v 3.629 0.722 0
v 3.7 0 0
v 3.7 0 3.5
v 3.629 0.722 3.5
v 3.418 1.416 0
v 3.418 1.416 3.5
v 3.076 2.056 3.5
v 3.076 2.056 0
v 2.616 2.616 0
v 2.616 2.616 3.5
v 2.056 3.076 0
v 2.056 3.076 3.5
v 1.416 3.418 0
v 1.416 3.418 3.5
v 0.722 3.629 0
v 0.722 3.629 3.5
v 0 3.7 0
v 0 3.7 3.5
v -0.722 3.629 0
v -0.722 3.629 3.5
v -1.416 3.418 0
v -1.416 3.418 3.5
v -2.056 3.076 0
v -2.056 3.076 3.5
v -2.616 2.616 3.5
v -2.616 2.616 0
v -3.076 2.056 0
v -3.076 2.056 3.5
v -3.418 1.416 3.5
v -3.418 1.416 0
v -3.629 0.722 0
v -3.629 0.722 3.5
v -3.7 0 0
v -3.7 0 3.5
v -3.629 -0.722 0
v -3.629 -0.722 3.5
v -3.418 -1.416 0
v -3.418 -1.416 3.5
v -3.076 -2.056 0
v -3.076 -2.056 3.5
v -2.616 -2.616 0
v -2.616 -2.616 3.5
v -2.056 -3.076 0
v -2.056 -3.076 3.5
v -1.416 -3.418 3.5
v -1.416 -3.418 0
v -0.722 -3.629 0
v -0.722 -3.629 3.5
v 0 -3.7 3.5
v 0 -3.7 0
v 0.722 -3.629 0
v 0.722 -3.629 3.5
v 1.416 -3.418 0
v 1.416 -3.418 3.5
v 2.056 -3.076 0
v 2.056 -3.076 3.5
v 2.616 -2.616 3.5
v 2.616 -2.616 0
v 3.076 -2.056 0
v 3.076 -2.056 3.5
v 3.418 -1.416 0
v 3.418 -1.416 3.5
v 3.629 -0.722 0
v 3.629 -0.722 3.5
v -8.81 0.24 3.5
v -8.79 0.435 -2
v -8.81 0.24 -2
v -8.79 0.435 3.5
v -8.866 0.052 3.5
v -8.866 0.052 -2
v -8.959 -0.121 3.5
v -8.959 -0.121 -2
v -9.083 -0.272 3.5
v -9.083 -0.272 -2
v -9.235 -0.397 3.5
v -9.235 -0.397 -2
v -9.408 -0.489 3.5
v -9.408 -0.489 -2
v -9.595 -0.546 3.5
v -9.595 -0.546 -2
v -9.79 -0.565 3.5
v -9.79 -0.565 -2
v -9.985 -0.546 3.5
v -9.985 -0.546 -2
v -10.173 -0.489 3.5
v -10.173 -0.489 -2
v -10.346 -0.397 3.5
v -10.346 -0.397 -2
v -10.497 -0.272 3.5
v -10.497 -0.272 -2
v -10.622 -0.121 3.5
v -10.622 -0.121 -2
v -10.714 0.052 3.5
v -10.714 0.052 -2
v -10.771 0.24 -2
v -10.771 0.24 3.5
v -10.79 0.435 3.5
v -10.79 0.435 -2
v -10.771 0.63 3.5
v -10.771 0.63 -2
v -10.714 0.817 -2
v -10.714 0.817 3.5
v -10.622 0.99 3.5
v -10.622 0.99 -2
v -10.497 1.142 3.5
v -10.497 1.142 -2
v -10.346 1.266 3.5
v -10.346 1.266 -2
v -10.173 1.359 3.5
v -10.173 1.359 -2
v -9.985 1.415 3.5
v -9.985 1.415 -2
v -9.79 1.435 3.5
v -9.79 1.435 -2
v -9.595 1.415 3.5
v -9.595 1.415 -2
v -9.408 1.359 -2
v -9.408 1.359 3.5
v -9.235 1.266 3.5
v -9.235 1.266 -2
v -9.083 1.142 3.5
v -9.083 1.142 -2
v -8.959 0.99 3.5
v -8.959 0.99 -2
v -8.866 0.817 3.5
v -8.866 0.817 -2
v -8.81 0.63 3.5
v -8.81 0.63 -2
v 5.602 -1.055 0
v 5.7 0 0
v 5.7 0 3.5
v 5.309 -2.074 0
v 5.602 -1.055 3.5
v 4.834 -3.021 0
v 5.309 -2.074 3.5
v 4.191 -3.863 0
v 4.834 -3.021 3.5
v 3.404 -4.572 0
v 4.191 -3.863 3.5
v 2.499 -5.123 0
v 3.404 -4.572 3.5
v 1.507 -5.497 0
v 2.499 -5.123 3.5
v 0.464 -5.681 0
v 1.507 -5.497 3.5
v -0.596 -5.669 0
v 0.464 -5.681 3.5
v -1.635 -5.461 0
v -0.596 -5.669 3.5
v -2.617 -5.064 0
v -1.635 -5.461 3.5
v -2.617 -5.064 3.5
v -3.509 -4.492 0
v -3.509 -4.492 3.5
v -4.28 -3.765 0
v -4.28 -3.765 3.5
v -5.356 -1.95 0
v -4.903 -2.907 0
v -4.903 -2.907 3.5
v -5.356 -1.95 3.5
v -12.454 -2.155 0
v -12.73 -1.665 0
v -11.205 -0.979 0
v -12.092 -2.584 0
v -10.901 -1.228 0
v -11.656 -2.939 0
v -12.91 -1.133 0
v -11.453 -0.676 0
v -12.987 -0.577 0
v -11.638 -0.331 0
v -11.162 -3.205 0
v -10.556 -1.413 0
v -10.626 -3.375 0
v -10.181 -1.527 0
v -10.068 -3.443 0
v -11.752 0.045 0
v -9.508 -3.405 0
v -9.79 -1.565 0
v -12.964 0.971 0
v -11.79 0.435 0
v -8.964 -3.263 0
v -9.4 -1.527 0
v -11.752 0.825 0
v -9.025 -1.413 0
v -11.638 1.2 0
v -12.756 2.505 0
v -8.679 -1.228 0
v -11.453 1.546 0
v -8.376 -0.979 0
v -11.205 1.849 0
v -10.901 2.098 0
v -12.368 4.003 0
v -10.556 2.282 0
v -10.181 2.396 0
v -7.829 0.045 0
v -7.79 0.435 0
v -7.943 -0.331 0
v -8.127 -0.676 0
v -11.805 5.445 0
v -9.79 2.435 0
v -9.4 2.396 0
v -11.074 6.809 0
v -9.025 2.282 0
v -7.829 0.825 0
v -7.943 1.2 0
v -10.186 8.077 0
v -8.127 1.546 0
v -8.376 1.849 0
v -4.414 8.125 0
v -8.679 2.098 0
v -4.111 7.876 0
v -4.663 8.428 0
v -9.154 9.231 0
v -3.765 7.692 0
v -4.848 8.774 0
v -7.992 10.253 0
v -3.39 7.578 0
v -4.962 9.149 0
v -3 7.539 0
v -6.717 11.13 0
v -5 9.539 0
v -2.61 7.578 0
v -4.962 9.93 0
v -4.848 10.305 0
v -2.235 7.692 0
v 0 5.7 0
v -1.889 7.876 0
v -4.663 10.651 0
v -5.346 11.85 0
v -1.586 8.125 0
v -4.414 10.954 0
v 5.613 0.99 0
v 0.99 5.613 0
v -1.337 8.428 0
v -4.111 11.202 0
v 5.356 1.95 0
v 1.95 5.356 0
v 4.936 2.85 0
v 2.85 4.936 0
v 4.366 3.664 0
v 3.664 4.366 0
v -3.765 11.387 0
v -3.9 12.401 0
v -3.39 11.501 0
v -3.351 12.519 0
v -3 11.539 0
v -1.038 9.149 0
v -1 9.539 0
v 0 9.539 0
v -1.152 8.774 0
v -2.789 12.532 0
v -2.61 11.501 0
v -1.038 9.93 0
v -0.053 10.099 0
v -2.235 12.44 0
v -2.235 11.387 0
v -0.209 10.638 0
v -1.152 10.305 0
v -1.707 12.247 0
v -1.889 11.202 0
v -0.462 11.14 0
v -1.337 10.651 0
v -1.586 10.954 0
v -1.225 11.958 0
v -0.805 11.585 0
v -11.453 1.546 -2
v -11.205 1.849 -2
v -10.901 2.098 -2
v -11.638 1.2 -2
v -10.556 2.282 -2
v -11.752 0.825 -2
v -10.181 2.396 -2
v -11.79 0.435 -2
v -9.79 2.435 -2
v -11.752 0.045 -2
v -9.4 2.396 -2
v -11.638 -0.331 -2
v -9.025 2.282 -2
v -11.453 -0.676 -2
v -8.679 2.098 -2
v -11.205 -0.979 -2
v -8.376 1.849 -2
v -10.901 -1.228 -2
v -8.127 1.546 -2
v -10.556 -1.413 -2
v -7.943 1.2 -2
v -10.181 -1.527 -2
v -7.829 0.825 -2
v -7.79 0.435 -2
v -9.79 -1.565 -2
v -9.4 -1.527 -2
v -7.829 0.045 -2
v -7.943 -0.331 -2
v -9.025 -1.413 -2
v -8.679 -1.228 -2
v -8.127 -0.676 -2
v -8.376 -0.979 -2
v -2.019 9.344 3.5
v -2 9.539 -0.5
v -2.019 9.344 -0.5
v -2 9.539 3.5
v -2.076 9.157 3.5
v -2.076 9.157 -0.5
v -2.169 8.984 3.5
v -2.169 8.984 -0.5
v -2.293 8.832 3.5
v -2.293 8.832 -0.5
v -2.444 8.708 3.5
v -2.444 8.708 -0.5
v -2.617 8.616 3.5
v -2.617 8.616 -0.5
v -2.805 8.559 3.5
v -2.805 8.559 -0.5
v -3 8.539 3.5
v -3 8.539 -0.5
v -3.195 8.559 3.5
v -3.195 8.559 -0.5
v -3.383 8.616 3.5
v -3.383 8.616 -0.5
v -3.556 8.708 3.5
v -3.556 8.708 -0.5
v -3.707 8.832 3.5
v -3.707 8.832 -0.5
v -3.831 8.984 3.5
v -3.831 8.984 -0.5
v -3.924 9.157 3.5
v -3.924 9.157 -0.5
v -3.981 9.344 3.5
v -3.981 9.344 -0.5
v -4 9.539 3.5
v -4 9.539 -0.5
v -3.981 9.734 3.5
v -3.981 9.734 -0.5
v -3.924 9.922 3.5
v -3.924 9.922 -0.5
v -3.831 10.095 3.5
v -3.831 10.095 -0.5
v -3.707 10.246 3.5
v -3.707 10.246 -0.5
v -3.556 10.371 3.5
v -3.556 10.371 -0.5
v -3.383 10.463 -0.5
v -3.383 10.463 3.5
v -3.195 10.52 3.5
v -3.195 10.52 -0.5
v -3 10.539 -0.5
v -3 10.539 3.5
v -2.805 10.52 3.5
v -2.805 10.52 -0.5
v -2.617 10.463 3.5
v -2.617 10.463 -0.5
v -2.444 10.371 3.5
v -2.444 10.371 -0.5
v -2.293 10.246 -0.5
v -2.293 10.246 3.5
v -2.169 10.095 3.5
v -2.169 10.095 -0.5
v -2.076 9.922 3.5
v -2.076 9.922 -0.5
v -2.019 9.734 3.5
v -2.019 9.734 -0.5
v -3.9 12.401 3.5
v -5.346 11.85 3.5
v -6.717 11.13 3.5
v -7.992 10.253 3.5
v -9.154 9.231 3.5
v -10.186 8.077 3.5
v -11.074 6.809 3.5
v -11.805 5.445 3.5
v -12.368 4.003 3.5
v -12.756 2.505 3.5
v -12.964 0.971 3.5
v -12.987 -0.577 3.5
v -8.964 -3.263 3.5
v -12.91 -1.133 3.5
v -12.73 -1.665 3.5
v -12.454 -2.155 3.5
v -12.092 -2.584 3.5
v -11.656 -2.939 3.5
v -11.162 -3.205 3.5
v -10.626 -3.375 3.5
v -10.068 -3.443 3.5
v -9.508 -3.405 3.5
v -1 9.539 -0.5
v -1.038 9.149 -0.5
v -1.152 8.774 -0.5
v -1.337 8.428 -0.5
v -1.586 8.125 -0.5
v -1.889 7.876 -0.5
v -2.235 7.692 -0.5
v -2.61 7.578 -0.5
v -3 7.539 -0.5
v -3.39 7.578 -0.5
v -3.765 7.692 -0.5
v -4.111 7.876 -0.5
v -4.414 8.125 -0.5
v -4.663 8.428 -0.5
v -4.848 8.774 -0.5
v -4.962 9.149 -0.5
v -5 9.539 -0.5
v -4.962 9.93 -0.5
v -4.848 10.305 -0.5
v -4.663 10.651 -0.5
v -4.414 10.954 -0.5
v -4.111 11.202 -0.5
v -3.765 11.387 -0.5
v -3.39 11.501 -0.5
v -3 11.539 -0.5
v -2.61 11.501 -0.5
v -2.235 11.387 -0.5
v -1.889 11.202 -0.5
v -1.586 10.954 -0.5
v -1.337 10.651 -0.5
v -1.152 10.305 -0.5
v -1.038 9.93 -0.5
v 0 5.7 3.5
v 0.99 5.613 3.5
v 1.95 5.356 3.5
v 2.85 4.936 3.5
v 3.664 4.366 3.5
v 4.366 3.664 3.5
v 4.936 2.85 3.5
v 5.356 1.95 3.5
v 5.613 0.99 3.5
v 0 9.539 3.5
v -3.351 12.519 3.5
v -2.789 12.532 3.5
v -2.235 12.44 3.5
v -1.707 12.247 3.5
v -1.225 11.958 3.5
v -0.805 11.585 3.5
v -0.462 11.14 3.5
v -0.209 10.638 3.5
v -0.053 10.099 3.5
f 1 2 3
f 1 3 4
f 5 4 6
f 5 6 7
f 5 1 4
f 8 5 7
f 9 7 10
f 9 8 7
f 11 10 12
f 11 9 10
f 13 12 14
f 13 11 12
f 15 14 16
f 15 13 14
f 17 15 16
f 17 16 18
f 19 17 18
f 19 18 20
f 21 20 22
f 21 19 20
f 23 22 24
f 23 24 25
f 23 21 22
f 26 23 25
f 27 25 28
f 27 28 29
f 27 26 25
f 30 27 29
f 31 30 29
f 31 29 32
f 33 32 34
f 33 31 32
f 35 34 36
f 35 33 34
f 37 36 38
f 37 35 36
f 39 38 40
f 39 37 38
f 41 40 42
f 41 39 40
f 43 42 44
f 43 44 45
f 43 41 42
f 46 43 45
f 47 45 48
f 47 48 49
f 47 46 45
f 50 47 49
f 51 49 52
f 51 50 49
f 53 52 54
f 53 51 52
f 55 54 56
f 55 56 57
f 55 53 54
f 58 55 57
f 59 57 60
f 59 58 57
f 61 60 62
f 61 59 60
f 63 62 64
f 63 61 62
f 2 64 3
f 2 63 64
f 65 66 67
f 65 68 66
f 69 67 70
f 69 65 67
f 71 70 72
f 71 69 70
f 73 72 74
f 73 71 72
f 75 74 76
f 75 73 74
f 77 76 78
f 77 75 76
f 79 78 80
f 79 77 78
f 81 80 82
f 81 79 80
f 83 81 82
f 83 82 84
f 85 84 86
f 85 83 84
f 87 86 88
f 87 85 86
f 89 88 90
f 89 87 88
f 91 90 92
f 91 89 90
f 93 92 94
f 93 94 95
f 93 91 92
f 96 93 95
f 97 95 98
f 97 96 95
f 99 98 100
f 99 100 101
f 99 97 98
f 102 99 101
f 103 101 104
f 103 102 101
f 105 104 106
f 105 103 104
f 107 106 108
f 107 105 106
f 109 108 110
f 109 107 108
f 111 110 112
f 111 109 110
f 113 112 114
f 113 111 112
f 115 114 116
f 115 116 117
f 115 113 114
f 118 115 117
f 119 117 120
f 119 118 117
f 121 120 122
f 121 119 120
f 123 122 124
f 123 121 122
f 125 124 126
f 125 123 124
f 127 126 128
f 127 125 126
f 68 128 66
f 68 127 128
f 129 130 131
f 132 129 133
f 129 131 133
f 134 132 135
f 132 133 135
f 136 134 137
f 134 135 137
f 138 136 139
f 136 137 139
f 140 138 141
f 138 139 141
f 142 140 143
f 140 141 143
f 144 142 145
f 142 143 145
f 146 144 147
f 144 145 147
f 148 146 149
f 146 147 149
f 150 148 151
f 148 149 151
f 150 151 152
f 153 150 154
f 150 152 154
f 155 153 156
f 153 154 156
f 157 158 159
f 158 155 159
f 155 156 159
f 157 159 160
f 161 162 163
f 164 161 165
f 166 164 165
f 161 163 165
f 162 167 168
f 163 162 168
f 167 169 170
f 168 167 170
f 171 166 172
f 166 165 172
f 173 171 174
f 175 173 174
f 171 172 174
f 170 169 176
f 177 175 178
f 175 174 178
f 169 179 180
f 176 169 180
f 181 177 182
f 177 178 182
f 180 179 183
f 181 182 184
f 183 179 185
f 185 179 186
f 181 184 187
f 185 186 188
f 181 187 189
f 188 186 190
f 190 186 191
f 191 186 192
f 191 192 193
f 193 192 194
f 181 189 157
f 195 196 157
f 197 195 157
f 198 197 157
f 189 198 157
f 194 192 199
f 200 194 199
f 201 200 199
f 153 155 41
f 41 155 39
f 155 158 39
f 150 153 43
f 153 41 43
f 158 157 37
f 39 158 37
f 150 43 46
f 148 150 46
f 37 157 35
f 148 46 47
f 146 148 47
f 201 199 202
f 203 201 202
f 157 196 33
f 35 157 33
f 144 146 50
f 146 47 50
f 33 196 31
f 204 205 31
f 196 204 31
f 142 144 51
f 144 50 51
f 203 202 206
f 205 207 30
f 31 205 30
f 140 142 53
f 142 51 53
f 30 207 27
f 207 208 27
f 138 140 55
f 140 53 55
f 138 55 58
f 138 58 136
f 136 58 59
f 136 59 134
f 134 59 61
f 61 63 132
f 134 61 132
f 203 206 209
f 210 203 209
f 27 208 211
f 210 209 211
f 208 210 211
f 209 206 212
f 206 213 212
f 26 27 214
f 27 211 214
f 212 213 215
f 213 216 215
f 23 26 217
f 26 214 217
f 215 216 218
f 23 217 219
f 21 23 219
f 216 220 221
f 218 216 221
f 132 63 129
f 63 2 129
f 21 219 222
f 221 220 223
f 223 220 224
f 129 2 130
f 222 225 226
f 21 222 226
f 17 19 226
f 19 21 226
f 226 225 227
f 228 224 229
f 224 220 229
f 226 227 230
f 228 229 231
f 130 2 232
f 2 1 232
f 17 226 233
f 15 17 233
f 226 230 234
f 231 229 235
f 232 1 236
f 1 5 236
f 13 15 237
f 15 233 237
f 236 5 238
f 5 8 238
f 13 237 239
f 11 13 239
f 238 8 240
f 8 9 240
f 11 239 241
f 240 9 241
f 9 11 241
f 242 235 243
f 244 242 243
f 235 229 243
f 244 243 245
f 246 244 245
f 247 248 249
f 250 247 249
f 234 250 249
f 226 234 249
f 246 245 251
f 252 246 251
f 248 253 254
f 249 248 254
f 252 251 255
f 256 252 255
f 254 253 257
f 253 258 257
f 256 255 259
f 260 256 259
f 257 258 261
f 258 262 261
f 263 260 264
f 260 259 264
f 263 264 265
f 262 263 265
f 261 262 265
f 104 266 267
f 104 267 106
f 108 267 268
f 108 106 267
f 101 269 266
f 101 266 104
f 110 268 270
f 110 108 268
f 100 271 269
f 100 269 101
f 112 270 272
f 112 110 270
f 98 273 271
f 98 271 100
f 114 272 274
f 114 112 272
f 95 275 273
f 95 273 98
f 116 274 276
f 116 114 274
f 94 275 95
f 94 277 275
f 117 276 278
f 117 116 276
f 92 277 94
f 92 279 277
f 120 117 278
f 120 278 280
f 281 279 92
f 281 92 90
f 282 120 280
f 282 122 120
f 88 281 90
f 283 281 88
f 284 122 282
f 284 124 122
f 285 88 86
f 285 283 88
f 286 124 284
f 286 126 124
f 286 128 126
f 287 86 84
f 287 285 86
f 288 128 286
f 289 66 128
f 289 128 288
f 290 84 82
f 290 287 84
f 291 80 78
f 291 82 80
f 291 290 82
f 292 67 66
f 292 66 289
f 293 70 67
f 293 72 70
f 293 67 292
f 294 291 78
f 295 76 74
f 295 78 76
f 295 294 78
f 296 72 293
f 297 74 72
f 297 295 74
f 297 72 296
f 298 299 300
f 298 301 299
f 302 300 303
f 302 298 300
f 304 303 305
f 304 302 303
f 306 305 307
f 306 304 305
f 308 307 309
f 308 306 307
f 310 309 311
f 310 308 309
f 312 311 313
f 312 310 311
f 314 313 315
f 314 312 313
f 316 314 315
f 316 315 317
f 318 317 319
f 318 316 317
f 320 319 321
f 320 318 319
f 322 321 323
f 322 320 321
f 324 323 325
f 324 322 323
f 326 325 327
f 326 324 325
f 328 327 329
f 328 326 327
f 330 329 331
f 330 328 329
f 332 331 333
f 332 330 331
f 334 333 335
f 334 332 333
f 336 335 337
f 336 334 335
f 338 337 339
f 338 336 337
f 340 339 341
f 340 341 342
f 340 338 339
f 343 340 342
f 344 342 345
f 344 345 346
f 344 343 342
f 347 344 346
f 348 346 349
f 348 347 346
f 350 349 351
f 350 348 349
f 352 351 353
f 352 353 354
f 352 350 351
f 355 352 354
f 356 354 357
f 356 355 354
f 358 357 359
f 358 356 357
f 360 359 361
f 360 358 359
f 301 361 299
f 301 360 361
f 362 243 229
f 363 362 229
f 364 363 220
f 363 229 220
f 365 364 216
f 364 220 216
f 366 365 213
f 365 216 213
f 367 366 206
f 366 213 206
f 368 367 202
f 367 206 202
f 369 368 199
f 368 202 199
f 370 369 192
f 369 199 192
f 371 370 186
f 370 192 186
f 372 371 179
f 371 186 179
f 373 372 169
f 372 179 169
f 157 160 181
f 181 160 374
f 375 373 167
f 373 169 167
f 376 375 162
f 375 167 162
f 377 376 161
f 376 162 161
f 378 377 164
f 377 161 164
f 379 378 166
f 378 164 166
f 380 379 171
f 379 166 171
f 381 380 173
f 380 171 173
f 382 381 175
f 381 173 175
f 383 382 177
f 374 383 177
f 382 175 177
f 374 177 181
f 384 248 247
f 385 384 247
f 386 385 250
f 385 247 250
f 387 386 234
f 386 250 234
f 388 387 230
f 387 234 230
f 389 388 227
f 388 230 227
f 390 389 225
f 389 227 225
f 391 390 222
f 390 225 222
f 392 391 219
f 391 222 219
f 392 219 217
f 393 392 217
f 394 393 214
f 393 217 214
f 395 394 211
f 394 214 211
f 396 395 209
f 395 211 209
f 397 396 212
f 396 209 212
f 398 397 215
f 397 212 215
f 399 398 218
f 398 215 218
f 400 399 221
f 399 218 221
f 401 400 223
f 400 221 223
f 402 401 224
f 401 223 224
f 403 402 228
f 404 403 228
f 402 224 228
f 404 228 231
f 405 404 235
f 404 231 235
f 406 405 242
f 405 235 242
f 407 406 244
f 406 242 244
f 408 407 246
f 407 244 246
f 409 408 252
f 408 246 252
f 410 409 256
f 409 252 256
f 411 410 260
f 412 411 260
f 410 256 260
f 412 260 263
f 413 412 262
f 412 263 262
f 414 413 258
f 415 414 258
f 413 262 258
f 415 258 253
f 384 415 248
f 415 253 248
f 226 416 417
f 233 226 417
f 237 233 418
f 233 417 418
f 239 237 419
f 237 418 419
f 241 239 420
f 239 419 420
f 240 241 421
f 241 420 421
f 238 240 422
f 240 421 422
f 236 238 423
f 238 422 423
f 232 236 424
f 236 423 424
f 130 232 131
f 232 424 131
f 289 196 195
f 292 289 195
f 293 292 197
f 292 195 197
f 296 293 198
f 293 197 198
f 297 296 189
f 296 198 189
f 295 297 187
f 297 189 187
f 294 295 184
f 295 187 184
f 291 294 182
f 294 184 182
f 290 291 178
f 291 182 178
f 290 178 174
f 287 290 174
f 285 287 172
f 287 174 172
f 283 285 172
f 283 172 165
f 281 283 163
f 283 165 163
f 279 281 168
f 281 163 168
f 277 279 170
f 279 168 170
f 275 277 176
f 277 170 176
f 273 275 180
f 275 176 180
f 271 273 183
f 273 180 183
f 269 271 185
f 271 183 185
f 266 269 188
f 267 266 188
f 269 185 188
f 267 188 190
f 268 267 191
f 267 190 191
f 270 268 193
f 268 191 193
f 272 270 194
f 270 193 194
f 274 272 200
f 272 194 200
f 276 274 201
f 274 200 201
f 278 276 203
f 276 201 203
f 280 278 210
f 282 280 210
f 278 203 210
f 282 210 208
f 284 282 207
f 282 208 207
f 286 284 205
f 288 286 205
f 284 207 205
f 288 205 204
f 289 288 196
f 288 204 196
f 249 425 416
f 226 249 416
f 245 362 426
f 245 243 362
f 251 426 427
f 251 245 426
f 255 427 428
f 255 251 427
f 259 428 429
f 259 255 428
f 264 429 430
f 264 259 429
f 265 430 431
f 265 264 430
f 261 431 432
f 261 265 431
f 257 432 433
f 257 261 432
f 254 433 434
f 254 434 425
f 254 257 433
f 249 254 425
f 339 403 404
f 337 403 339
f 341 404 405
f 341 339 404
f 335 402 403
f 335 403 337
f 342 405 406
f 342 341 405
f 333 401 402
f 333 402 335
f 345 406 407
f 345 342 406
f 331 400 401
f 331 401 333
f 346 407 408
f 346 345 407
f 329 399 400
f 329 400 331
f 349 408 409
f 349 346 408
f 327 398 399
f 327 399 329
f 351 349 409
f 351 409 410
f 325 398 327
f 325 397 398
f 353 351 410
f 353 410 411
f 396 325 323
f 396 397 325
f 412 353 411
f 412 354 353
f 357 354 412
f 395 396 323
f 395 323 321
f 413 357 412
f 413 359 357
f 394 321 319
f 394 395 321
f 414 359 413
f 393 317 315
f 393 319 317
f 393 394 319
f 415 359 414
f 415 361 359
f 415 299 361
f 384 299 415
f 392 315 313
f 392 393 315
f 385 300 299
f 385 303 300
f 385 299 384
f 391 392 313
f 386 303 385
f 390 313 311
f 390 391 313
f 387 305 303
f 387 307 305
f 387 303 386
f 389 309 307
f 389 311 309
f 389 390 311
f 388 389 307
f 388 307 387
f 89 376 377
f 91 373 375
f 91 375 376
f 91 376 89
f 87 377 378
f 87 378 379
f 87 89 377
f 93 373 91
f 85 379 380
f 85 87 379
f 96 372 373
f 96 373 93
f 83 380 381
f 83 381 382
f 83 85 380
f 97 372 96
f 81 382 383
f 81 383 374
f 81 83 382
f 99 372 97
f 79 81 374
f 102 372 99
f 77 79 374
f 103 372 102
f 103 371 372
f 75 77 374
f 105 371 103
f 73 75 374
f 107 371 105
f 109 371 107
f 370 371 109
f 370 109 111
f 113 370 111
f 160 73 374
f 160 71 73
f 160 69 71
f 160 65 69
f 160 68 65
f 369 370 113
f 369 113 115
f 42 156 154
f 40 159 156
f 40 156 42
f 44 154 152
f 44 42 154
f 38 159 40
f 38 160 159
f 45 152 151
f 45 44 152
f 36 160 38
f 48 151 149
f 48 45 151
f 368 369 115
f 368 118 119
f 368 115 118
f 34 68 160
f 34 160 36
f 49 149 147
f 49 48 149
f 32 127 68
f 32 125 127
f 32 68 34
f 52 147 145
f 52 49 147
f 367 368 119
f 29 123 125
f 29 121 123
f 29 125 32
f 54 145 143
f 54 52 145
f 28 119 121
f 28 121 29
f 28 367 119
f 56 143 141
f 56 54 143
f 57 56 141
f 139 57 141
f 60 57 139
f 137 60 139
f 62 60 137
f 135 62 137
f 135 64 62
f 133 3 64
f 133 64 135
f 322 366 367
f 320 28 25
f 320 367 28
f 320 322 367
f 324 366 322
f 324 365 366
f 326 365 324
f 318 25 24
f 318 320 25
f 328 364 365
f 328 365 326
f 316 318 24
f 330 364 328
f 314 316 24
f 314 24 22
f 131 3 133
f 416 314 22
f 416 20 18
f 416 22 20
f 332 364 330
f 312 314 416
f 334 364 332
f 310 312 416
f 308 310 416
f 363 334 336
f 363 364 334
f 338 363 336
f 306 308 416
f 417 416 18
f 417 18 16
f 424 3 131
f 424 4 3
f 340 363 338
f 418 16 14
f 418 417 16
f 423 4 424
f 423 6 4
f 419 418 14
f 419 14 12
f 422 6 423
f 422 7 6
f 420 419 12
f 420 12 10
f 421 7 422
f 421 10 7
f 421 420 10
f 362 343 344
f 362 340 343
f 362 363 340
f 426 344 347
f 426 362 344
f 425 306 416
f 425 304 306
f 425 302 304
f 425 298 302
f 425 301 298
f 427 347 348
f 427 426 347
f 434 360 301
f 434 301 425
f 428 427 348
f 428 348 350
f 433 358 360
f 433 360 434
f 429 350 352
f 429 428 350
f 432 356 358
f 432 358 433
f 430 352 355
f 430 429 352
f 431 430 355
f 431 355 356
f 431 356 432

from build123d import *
from build123d.topology import SkipClean

# Parameters (mm, degrees)
SKETCH1_R           = 13
SKETCH1_R_2         = 3.7
BOSS_EXTRUDE1_DEPTH = 3.5
CUT_EXTRUDE1_START  = -10
CUT_EXTRUDE1_DEPTH  = 10
SKETCH3_R           = 1
CUT_EXTRUDE2_DEPTH  = 10
SKETCH5_R           = 1
CUT_EXTRUDE3_DEPTH  = 6
FILLET1_R           = 3
SKETCH6_R           = 2
SKETCH6_R_2         = 1
BOSS_EXTRUDE2_DEPTH = 2
SKETCH6_3_R         = 2
SKETCH6_3_R_2       = 1
BOSS_EXTRUDE3_DEPTH = 0.5


with BuildPart() as part:
    # Sketch1 → Boss-Extrude1 (new body)
    with BuildSketch(Plane.XY):
        Circle(SKETCH1_R)
        Circle(SKETCH1_R_2, mode=Mode.SUBTRACT)
    extrude(amount=BOSS_EXTRUDE1_DEPTH)

    # Sketch2 → Cut-Extrude1 (cut)
    with BuildSketch(Plane.XY.offset(3.5).offset(CUT_EXTRUDE1_START)):
        with BuildLine():
            ThreePointArc((5.7, 0), (0.989794613, -5.613404192), (-5.356247938, -1.949514817))
            Line((-5.356247938, -1.949514817), (-12.21600407, -4.446261863))
            ThreePointArc((-12.21600407, -4.446261863), (2.25742631, -12.802500789), (13, 0))
            ThreePointArc((13, 0), (9.192388155, 9.192388155), (0, 13))
            Line((0, 13), (0, 5.7))
            ThreePointArc((0, 5.7), (4.030508653, 4.030508653), (5.7, 0))
        make_face()
    extrude(amount=CUT_EXTRUDE1_DEPTH, mode=Mode.SUBTRACT)

    # Sketch3 → Cut-Extrude2 (cut)
    with BuildSketch(Plane.XY.offset(3.5)):
        with Locations((-3, 9.539392014)):
            Circle(SKETCH3_R)
    extrude(amount=-CUT_EXTRUDE2_DEPTH, mode=Mode.SUBTRACT)

    # Sketch5 → Cut-Extrude3 (cut)
    with BuildSketch(Plane.XY.offset(3.5)):
        with Locations((-9.790353578, 0.434714634)):
            Circle(SKETCH5_R)
    extrude(amount=-CUT_EXTRUDE3_DEPTH, mode=Mode.SUBTRACT)

    # Fillet1
    fillet1_edges = [part.edges().sort_by_distance(p)[0] for p in [
        (-12.21600407, -4.446261863, 1.75),
        (0, 13, 1.75),
    ]]
    fillet(fillet1_edges, radius=FILLET1_R)

    # Sketch6 → Boss-Extrude2 (add)
    with SkipClean():  # the faces are left unmerged after this step: merging them gives an invalid solid
        with BuildSketch(Plane(origin=(0, 0, 0), x_dir=(-1, 0, 0), z_dir=(0, 0, -1))):
            with Locations((9.790353578, 0.434714634)):
                Circle(SKETCH6_R)
            with Locations((9.790353578, 0.434714634)):
                Circle(SKETCH6_R_2, mode=Mode.SUBTRACT)
        extrude(amount=BOSS_EXTRUDE2_DEPTH)

    # Sketch6<3> → Boss-Extrude3 (add)
    with SkipClean():  # the faces are left unmerged after this step: merging them gives an invalid solid
        with BuildSketch(Plane(origin=(0, 0, 0), x_dir=(-1, 0, 0), z_dir=(0, 0, -1))):
            with Locations((3, 9.539392014)):
                Circle(SKETCH6_3_R)
            with Locations((3, 9.539392014)):
                Circle(SKETCH6_3_R_2, mode=Mode.SUBTRACT)
        extrude(amount=BOSS_EXTRUDE3_DEPTH)


solid = part.part
